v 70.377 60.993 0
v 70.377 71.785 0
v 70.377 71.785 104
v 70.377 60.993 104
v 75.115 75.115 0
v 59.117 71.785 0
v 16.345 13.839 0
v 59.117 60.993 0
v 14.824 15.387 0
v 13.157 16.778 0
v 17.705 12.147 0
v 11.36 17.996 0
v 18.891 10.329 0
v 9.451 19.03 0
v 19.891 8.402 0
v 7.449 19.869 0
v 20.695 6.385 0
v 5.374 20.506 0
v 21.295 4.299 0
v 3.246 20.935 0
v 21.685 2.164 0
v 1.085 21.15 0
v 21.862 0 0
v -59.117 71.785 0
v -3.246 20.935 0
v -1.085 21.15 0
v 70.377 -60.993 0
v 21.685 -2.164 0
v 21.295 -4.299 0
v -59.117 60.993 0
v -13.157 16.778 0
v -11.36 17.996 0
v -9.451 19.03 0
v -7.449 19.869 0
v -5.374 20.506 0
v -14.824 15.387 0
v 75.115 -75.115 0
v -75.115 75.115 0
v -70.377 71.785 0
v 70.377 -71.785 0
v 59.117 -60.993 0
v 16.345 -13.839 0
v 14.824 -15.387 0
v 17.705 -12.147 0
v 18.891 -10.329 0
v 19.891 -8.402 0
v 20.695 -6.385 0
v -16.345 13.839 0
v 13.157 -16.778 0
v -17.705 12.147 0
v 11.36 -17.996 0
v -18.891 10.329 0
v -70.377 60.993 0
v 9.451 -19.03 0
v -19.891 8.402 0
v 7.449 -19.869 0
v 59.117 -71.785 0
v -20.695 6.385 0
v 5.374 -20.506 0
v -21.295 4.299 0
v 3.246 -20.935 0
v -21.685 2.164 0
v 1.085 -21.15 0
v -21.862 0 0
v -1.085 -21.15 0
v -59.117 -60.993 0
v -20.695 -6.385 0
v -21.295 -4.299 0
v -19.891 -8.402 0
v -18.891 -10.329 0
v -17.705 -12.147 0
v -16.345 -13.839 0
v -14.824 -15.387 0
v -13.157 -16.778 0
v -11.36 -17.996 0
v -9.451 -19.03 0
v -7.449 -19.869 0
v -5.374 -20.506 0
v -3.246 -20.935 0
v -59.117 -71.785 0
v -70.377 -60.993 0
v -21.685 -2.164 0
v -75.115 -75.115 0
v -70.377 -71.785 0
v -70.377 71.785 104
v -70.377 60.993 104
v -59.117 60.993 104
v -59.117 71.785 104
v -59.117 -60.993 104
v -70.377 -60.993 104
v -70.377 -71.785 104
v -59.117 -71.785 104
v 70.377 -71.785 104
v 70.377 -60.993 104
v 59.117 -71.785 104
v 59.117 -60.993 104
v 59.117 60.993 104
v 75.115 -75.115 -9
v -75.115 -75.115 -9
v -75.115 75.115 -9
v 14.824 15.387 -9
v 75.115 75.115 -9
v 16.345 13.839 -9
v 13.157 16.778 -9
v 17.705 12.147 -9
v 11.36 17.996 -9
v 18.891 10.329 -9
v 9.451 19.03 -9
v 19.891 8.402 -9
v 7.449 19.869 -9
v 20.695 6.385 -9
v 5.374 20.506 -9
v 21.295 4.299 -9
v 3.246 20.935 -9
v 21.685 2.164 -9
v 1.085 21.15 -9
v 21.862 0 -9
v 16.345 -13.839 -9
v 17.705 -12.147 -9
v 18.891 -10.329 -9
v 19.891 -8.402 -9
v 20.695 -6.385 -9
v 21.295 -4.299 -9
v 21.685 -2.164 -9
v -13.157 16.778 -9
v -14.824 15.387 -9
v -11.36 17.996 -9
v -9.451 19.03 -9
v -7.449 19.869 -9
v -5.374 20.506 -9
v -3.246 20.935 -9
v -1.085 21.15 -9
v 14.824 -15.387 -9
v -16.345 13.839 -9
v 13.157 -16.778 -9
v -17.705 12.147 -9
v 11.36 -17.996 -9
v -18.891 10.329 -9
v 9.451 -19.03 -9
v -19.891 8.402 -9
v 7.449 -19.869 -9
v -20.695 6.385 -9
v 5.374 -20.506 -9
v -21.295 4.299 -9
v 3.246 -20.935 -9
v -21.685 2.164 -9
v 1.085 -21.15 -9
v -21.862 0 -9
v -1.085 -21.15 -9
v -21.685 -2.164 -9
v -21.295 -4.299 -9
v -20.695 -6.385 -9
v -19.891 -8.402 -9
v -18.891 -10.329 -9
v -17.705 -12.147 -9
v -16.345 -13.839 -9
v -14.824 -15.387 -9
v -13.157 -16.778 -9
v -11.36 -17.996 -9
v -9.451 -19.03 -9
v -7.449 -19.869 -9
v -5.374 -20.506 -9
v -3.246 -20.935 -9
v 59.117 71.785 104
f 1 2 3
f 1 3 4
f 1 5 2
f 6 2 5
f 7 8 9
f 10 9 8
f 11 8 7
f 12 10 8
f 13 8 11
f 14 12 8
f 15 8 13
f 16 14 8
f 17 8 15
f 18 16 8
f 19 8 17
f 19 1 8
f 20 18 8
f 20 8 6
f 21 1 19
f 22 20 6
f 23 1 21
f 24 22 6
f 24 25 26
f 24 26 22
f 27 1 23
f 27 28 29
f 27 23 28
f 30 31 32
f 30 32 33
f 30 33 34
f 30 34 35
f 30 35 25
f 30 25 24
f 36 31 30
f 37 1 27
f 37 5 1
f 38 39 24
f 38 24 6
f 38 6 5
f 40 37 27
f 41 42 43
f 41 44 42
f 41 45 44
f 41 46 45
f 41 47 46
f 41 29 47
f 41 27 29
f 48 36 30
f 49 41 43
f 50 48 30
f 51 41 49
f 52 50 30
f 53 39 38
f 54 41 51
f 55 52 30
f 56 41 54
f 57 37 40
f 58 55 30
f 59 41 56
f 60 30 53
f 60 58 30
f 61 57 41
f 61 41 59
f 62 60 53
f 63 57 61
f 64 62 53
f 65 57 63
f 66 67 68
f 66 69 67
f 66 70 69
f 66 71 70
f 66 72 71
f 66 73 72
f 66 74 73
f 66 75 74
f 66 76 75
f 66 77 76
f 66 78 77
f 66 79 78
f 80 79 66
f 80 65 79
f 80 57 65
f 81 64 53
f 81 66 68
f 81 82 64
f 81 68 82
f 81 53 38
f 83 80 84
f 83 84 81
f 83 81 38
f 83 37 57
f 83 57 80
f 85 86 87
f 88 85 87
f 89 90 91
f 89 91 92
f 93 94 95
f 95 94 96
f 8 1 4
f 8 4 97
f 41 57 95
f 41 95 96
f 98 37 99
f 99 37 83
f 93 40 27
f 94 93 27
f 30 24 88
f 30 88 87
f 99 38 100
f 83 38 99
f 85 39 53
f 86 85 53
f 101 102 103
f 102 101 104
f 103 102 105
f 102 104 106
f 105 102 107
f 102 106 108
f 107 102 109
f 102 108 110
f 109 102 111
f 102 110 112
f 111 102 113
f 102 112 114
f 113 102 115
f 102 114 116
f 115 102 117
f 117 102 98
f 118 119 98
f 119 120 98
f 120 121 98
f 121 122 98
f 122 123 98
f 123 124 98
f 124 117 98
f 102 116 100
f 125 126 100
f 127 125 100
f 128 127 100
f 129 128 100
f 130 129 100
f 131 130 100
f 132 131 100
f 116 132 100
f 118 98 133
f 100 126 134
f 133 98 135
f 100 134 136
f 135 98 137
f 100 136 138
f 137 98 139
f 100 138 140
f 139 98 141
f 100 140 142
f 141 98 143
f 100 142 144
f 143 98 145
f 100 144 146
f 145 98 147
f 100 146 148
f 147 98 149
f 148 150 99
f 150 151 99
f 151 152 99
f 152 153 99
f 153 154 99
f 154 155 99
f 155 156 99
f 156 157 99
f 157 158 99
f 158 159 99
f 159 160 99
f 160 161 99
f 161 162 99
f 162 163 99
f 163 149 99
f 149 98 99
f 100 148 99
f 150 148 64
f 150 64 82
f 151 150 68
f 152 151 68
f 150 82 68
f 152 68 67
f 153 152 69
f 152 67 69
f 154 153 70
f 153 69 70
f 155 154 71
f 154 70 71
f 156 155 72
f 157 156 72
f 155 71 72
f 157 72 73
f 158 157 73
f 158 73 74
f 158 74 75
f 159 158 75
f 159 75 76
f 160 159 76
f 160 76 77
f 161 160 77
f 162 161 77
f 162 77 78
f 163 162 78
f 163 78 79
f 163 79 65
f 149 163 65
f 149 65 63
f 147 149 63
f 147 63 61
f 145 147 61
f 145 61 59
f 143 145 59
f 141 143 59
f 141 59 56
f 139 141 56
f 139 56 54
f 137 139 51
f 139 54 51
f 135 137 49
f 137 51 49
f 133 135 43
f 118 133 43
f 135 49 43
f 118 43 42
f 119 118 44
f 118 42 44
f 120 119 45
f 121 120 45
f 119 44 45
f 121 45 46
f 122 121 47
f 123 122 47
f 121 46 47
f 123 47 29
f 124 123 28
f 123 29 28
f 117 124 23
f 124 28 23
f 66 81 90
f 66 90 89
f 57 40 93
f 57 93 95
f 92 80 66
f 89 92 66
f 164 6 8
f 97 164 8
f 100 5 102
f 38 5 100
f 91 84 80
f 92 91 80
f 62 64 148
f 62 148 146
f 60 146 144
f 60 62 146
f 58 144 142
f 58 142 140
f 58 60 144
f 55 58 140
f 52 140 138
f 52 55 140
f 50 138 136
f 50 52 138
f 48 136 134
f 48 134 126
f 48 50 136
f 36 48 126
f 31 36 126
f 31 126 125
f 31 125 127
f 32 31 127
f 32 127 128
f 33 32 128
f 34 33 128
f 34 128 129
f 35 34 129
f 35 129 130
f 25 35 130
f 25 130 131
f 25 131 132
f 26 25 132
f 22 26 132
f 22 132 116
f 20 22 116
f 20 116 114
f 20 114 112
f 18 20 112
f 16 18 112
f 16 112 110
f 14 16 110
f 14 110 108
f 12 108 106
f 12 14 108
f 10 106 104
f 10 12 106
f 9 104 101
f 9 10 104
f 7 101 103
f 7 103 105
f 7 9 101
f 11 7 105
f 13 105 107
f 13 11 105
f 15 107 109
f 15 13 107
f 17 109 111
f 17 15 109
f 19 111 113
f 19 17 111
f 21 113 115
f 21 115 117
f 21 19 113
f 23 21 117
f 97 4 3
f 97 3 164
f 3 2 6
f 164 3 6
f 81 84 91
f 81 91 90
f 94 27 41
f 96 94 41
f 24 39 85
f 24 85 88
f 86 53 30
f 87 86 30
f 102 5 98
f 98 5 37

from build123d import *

# Parameters (mm, degrees)
F0_W     = 11.260315
F0_H     = 10.791138
F1_DEPTH = 104
F2_W     = 149.32213
F2_H     = 149.927892
F3_DEPTH = 9
F4_R     = 21.873079
F5_DEPTH = 9.001


with BuildPart() as f1:
    # F0 (on Top) → F1 (new body)
    with BuildSketch(Plane.XY):
        with Locations((-64.74682, -66.388942)):
            Rectangle(F0_W, F0_H)
    extrude(amount=F1_DEPTH)

    # F2 (on Top) → F3 (join)
    with BuildSketch(Plane.XY):
        with Locations((-0.454325, -0.151444)):
            Rectangle(F2_W, F2_H)
    extrude(amount=-F3_DEPTH)

    # F4 (on face) → F5 (cut, through all)
    with BuildSketch(Plane.XY):
        with Locations((0, 0.696229)):
            Circle(F4_R)
    extrude(amount=-F5_DEPTH, mode=Mode.SUBTRACT)

    # F6: F1 across plane


with BuildPart() as f1_1:
    add(f1.part)
    add(f1.part.mirror(Plane.XZ))

    # F7: F1 across plane


with BuildPart() as f1_2:
    add(f1_1.part)
    add(f1_1.part.mirror(Plane.YZ))


solid = f1_2.part
